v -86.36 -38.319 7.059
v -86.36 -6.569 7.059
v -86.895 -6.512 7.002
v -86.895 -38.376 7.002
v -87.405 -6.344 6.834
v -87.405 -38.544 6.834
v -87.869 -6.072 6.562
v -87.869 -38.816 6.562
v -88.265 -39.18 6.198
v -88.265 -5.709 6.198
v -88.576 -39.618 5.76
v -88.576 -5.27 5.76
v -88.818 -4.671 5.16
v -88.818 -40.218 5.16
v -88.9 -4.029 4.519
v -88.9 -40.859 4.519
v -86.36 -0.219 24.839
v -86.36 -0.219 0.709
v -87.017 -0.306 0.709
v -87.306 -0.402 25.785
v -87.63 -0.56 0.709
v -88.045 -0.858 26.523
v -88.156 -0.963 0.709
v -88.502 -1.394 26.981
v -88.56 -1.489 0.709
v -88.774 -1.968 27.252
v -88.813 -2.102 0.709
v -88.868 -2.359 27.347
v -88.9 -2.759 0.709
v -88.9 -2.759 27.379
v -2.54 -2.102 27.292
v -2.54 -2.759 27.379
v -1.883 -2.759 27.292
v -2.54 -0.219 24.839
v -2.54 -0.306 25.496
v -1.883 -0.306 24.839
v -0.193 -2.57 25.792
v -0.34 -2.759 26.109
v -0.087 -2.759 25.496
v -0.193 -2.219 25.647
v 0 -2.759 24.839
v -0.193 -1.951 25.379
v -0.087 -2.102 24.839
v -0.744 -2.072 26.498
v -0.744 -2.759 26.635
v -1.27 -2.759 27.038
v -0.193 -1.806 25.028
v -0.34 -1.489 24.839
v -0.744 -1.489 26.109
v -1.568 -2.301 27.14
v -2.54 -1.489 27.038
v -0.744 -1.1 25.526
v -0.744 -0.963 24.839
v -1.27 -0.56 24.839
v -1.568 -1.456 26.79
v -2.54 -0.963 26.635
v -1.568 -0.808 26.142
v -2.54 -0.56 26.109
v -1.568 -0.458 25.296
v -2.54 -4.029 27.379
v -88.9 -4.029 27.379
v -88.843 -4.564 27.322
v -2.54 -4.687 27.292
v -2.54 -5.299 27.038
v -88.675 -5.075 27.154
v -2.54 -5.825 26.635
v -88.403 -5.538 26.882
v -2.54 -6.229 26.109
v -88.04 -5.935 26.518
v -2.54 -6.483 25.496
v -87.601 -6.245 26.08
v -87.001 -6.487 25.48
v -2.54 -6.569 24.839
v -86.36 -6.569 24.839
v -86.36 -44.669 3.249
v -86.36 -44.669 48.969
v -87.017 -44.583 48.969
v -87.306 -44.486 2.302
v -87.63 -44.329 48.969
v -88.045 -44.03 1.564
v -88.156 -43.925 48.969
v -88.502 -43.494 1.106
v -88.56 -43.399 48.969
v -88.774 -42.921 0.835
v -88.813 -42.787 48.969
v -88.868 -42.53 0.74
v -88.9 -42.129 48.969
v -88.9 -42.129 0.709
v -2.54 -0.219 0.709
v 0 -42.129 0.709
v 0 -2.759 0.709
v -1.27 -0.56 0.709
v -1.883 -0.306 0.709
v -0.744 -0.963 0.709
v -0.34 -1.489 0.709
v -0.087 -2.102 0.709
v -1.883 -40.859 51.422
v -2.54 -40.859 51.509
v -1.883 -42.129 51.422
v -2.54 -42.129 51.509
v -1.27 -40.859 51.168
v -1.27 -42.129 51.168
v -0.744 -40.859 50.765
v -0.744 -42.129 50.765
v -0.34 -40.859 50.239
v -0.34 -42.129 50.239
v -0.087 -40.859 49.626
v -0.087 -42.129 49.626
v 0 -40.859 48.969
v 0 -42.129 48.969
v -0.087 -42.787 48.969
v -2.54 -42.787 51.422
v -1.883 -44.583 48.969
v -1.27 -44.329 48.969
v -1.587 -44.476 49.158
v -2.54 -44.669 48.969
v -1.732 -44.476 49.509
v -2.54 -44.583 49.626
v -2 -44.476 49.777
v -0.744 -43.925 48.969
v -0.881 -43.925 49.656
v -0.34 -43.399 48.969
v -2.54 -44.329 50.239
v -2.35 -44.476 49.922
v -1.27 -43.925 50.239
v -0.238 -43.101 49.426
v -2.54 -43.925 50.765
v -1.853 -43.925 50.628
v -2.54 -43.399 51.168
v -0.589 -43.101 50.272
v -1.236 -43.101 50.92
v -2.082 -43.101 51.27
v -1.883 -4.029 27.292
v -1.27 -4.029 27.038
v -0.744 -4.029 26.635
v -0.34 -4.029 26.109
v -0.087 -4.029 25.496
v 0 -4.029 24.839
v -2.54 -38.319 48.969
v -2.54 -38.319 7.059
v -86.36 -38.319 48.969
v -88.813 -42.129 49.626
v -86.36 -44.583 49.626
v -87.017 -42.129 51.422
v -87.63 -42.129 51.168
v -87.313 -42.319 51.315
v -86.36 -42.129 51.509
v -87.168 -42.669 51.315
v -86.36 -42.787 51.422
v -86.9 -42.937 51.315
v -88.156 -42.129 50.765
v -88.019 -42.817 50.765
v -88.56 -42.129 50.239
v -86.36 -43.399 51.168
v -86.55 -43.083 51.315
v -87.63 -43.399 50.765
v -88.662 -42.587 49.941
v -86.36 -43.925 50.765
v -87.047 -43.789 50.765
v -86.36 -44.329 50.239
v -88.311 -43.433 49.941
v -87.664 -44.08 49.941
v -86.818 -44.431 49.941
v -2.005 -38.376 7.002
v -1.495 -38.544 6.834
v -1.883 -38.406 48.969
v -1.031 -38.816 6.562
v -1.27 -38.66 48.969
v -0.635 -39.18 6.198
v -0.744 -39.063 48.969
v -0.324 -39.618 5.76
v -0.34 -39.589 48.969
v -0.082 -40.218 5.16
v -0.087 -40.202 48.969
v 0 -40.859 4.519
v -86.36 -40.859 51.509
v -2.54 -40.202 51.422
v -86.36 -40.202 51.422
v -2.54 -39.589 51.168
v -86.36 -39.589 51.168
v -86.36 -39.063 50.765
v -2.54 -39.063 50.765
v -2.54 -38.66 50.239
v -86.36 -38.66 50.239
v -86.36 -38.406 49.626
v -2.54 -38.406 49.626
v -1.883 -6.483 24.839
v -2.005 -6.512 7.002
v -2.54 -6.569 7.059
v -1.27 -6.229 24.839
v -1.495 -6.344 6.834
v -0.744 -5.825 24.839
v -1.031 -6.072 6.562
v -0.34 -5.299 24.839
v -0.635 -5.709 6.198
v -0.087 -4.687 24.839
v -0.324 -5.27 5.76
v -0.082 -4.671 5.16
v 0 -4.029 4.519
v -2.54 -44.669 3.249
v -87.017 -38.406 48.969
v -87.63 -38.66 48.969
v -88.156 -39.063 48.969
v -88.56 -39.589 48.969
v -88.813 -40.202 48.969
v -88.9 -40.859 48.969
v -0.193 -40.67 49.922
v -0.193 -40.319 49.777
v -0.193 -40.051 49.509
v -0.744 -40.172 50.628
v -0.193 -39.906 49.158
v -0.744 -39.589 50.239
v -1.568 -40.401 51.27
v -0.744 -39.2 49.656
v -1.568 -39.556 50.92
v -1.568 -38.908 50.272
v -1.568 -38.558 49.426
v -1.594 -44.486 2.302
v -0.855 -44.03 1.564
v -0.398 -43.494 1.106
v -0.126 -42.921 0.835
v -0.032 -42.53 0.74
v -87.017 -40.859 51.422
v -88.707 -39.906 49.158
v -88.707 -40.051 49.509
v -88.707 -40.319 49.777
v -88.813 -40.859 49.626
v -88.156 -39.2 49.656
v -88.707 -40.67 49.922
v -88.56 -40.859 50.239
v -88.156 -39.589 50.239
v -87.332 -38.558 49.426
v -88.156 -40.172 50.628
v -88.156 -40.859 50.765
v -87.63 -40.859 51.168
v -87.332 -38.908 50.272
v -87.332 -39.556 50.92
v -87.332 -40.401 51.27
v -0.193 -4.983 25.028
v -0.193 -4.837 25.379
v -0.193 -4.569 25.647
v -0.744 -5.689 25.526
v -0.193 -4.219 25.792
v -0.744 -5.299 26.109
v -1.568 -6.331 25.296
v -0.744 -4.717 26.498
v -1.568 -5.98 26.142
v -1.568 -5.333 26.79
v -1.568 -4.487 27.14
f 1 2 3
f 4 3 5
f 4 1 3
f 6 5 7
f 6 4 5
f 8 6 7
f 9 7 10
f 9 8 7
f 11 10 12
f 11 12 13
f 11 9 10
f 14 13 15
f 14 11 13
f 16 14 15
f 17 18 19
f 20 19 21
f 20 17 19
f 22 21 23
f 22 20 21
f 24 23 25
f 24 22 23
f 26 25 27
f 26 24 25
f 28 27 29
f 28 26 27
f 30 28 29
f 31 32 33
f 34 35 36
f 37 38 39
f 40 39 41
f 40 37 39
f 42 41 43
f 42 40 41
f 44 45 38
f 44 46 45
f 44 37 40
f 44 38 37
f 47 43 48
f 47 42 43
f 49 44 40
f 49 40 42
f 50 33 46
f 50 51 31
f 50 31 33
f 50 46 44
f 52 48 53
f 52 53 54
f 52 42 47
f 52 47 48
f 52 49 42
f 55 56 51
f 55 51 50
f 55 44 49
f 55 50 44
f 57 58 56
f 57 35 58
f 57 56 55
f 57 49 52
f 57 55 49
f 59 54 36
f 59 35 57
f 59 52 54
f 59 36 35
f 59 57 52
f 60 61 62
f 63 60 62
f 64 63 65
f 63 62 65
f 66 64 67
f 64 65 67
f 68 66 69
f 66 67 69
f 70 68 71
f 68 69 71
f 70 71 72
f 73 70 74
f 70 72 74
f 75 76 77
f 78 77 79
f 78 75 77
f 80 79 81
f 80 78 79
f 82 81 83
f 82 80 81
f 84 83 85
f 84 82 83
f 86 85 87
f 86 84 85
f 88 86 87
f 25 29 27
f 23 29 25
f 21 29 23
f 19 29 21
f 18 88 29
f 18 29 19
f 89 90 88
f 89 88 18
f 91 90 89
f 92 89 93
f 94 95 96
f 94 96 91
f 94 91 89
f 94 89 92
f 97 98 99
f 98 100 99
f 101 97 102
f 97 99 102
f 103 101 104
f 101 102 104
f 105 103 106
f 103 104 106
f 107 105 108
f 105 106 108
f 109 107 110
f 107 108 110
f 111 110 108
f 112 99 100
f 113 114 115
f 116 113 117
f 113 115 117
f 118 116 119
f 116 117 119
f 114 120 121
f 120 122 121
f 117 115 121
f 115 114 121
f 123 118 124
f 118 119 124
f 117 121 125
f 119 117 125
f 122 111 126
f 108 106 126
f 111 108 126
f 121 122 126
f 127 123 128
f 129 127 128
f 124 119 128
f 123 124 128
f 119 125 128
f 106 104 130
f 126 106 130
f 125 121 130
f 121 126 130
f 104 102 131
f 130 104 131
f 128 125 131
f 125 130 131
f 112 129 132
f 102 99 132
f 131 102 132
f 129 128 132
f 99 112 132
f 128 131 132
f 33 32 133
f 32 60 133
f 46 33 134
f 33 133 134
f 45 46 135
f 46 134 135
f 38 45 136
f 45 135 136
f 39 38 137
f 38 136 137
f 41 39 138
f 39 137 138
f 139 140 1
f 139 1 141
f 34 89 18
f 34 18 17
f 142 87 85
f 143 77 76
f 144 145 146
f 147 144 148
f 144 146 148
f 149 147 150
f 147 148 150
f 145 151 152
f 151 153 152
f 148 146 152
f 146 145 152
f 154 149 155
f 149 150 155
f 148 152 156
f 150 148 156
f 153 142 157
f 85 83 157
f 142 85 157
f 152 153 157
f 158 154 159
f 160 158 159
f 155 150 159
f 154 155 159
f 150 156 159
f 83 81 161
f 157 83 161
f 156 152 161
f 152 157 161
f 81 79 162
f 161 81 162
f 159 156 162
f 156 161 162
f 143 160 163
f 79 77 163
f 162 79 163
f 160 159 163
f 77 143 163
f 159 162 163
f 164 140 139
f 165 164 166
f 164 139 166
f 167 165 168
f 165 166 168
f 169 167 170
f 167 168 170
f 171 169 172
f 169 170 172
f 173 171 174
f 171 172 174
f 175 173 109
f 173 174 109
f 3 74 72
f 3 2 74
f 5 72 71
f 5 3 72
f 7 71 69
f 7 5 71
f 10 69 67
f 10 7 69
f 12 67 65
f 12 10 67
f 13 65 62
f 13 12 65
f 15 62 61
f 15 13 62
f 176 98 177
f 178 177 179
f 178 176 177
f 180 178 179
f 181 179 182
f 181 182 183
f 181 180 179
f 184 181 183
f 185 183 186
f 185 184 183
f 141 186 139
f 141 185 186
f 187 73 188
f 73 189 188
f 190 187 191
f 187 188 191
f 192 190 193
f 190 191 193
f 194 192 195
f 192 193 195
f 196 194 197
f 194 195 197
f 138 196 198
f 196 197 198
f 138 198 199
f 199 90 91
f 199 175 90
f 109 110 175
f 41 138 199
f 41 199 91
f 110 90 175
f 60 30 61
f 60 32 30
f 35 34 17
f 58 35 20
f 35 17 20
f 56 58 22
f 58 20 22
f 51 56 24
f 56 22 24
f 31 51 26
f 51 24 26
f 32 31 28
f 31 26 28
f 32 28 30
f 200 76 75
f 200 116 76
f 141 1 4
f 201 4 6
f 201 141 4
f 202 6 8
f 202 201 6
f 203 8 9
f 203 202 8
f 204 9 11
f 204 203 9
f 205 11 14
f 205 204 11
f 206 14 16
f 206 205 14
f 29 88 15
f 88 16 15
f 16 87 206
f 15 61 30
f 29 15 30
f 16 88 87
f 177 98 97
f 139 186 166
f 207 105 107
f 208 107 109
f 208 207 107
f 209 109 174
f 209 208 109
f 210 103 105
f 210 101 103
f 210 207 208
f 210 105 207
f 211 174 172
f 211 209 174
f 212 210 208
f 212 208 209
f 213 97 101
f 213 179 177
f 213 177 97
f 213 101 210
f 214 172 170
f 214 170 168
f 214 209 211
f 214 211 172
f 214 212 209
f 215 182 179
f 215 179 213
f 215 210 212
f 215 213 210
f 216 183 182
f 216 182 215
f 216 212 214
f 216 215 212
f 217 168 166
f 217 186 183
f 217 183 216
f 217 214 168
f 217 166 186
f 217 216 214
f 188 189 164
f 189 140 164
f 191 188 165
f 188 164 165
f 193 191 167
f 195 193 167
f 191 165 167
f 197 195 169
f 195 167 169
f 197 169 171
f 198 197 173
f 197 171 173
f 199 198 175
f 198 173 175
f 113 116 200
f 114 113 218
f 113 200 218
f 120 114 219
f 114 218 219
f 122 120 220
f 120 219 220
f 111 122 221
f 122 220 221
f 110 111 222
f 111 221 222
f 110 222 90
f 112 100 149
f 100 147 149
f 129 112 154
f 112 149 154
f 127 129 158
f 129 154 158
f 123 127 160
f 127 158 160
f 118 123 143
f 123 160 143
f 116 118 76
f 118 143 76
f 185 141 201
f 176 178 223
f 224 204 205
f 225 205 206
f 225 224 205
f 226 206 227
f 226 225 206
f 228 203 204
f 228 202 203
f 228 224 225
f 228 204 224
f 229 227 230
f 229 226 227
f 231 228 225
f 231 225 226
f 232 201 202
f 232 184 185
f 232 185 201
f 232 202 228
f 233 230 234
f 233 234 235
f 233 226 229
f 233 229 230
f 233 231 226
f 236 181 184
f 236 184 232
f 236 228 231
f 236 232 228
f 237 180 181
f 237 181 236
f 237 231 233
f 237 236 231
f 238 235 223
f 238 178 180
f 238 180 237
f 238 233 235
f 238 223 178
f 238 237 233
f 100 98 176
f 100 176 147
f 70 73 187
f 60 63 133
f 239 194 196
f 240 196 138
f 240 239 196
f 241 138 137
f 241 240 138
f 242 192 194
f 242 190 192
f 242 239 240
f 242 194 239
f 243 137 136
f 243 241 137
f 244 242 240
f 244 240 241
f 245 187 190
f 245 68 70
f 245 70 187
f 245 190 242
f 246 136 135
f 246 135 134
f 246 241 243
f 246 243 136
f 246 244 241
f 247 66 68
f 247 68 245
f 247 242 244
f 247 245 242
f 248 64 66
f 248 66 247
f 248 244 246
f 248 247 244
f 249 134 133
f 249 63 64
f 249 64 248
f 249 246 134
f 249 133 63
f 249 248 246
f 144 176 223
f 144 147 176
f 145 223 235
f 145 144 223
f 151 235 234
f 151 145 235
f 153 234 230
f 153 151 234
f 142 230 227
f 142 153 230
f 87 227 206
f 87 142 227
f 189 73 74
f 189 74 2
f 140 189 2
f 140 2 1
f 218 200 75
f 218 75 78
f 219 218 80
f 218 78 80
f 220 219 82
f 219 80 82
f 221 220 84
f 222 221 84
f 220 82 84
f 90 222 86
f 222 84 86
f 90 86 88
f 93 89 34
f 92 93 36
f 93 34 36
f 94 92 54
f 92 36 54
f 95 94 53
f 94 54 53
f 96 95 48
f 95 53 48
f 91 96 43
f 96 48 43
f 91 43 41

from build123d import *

# Parameters (mm, degrees)
F1_DEPTH = 88.9
F2_R     = 2.54


with BuildPart() as f1:
    # F0 (on Right) → F1 (new body)
    with BuildSketch(Plane.YZ):
        Polygon((-38.319263, 51.508548), (-44.669263, 51.508548), (-44.669263, 0.708548), (-0.219263, 0.708548), (-0.219263, 27.378548), (-6.569263, 27.378548), (-6.569263, 7.058548), (-38.319263, 7.058548), align=None)
    extrude(amount=-F1_DEPTH)

    # F2
    f2_edges = [f1.edges().sort_by_distance(p)[0] for p in [
        (-44.45, -0.219263, 27.378548),
        (-44.45, -6.569263, 27.378548),
        (-44.45, -38.319263, 51.508548),
        (-88.9, -6.569263, 17.218548),
        (-88.9, -22.444263, 7.058548),
        (-88.9, -38.319263, 29.283548),
        (-88.9, -44.669263, 26.108548),
        (-88.9, -41.494263, 51.508548),
        (-88.9, -0.219263, 14.043548),
        (0, -41.494263, 51.508548),
        (0, -38.319263, 29.283548),
        (0, -44.669263, 26.108548),
        (0, -22.444263, 7.058548),
        (0, -6.569263, 17.218548),
        (0, -3.394263, 27.378548),
        (0, -0.219263, 14.043548),
        (-44.45, -44.669263, 51.508548),
        (-44.45, -44.669263, 0.708548),
    ]]
    fillet(f2_edges, radius=F2_R)


solid = f1.part
